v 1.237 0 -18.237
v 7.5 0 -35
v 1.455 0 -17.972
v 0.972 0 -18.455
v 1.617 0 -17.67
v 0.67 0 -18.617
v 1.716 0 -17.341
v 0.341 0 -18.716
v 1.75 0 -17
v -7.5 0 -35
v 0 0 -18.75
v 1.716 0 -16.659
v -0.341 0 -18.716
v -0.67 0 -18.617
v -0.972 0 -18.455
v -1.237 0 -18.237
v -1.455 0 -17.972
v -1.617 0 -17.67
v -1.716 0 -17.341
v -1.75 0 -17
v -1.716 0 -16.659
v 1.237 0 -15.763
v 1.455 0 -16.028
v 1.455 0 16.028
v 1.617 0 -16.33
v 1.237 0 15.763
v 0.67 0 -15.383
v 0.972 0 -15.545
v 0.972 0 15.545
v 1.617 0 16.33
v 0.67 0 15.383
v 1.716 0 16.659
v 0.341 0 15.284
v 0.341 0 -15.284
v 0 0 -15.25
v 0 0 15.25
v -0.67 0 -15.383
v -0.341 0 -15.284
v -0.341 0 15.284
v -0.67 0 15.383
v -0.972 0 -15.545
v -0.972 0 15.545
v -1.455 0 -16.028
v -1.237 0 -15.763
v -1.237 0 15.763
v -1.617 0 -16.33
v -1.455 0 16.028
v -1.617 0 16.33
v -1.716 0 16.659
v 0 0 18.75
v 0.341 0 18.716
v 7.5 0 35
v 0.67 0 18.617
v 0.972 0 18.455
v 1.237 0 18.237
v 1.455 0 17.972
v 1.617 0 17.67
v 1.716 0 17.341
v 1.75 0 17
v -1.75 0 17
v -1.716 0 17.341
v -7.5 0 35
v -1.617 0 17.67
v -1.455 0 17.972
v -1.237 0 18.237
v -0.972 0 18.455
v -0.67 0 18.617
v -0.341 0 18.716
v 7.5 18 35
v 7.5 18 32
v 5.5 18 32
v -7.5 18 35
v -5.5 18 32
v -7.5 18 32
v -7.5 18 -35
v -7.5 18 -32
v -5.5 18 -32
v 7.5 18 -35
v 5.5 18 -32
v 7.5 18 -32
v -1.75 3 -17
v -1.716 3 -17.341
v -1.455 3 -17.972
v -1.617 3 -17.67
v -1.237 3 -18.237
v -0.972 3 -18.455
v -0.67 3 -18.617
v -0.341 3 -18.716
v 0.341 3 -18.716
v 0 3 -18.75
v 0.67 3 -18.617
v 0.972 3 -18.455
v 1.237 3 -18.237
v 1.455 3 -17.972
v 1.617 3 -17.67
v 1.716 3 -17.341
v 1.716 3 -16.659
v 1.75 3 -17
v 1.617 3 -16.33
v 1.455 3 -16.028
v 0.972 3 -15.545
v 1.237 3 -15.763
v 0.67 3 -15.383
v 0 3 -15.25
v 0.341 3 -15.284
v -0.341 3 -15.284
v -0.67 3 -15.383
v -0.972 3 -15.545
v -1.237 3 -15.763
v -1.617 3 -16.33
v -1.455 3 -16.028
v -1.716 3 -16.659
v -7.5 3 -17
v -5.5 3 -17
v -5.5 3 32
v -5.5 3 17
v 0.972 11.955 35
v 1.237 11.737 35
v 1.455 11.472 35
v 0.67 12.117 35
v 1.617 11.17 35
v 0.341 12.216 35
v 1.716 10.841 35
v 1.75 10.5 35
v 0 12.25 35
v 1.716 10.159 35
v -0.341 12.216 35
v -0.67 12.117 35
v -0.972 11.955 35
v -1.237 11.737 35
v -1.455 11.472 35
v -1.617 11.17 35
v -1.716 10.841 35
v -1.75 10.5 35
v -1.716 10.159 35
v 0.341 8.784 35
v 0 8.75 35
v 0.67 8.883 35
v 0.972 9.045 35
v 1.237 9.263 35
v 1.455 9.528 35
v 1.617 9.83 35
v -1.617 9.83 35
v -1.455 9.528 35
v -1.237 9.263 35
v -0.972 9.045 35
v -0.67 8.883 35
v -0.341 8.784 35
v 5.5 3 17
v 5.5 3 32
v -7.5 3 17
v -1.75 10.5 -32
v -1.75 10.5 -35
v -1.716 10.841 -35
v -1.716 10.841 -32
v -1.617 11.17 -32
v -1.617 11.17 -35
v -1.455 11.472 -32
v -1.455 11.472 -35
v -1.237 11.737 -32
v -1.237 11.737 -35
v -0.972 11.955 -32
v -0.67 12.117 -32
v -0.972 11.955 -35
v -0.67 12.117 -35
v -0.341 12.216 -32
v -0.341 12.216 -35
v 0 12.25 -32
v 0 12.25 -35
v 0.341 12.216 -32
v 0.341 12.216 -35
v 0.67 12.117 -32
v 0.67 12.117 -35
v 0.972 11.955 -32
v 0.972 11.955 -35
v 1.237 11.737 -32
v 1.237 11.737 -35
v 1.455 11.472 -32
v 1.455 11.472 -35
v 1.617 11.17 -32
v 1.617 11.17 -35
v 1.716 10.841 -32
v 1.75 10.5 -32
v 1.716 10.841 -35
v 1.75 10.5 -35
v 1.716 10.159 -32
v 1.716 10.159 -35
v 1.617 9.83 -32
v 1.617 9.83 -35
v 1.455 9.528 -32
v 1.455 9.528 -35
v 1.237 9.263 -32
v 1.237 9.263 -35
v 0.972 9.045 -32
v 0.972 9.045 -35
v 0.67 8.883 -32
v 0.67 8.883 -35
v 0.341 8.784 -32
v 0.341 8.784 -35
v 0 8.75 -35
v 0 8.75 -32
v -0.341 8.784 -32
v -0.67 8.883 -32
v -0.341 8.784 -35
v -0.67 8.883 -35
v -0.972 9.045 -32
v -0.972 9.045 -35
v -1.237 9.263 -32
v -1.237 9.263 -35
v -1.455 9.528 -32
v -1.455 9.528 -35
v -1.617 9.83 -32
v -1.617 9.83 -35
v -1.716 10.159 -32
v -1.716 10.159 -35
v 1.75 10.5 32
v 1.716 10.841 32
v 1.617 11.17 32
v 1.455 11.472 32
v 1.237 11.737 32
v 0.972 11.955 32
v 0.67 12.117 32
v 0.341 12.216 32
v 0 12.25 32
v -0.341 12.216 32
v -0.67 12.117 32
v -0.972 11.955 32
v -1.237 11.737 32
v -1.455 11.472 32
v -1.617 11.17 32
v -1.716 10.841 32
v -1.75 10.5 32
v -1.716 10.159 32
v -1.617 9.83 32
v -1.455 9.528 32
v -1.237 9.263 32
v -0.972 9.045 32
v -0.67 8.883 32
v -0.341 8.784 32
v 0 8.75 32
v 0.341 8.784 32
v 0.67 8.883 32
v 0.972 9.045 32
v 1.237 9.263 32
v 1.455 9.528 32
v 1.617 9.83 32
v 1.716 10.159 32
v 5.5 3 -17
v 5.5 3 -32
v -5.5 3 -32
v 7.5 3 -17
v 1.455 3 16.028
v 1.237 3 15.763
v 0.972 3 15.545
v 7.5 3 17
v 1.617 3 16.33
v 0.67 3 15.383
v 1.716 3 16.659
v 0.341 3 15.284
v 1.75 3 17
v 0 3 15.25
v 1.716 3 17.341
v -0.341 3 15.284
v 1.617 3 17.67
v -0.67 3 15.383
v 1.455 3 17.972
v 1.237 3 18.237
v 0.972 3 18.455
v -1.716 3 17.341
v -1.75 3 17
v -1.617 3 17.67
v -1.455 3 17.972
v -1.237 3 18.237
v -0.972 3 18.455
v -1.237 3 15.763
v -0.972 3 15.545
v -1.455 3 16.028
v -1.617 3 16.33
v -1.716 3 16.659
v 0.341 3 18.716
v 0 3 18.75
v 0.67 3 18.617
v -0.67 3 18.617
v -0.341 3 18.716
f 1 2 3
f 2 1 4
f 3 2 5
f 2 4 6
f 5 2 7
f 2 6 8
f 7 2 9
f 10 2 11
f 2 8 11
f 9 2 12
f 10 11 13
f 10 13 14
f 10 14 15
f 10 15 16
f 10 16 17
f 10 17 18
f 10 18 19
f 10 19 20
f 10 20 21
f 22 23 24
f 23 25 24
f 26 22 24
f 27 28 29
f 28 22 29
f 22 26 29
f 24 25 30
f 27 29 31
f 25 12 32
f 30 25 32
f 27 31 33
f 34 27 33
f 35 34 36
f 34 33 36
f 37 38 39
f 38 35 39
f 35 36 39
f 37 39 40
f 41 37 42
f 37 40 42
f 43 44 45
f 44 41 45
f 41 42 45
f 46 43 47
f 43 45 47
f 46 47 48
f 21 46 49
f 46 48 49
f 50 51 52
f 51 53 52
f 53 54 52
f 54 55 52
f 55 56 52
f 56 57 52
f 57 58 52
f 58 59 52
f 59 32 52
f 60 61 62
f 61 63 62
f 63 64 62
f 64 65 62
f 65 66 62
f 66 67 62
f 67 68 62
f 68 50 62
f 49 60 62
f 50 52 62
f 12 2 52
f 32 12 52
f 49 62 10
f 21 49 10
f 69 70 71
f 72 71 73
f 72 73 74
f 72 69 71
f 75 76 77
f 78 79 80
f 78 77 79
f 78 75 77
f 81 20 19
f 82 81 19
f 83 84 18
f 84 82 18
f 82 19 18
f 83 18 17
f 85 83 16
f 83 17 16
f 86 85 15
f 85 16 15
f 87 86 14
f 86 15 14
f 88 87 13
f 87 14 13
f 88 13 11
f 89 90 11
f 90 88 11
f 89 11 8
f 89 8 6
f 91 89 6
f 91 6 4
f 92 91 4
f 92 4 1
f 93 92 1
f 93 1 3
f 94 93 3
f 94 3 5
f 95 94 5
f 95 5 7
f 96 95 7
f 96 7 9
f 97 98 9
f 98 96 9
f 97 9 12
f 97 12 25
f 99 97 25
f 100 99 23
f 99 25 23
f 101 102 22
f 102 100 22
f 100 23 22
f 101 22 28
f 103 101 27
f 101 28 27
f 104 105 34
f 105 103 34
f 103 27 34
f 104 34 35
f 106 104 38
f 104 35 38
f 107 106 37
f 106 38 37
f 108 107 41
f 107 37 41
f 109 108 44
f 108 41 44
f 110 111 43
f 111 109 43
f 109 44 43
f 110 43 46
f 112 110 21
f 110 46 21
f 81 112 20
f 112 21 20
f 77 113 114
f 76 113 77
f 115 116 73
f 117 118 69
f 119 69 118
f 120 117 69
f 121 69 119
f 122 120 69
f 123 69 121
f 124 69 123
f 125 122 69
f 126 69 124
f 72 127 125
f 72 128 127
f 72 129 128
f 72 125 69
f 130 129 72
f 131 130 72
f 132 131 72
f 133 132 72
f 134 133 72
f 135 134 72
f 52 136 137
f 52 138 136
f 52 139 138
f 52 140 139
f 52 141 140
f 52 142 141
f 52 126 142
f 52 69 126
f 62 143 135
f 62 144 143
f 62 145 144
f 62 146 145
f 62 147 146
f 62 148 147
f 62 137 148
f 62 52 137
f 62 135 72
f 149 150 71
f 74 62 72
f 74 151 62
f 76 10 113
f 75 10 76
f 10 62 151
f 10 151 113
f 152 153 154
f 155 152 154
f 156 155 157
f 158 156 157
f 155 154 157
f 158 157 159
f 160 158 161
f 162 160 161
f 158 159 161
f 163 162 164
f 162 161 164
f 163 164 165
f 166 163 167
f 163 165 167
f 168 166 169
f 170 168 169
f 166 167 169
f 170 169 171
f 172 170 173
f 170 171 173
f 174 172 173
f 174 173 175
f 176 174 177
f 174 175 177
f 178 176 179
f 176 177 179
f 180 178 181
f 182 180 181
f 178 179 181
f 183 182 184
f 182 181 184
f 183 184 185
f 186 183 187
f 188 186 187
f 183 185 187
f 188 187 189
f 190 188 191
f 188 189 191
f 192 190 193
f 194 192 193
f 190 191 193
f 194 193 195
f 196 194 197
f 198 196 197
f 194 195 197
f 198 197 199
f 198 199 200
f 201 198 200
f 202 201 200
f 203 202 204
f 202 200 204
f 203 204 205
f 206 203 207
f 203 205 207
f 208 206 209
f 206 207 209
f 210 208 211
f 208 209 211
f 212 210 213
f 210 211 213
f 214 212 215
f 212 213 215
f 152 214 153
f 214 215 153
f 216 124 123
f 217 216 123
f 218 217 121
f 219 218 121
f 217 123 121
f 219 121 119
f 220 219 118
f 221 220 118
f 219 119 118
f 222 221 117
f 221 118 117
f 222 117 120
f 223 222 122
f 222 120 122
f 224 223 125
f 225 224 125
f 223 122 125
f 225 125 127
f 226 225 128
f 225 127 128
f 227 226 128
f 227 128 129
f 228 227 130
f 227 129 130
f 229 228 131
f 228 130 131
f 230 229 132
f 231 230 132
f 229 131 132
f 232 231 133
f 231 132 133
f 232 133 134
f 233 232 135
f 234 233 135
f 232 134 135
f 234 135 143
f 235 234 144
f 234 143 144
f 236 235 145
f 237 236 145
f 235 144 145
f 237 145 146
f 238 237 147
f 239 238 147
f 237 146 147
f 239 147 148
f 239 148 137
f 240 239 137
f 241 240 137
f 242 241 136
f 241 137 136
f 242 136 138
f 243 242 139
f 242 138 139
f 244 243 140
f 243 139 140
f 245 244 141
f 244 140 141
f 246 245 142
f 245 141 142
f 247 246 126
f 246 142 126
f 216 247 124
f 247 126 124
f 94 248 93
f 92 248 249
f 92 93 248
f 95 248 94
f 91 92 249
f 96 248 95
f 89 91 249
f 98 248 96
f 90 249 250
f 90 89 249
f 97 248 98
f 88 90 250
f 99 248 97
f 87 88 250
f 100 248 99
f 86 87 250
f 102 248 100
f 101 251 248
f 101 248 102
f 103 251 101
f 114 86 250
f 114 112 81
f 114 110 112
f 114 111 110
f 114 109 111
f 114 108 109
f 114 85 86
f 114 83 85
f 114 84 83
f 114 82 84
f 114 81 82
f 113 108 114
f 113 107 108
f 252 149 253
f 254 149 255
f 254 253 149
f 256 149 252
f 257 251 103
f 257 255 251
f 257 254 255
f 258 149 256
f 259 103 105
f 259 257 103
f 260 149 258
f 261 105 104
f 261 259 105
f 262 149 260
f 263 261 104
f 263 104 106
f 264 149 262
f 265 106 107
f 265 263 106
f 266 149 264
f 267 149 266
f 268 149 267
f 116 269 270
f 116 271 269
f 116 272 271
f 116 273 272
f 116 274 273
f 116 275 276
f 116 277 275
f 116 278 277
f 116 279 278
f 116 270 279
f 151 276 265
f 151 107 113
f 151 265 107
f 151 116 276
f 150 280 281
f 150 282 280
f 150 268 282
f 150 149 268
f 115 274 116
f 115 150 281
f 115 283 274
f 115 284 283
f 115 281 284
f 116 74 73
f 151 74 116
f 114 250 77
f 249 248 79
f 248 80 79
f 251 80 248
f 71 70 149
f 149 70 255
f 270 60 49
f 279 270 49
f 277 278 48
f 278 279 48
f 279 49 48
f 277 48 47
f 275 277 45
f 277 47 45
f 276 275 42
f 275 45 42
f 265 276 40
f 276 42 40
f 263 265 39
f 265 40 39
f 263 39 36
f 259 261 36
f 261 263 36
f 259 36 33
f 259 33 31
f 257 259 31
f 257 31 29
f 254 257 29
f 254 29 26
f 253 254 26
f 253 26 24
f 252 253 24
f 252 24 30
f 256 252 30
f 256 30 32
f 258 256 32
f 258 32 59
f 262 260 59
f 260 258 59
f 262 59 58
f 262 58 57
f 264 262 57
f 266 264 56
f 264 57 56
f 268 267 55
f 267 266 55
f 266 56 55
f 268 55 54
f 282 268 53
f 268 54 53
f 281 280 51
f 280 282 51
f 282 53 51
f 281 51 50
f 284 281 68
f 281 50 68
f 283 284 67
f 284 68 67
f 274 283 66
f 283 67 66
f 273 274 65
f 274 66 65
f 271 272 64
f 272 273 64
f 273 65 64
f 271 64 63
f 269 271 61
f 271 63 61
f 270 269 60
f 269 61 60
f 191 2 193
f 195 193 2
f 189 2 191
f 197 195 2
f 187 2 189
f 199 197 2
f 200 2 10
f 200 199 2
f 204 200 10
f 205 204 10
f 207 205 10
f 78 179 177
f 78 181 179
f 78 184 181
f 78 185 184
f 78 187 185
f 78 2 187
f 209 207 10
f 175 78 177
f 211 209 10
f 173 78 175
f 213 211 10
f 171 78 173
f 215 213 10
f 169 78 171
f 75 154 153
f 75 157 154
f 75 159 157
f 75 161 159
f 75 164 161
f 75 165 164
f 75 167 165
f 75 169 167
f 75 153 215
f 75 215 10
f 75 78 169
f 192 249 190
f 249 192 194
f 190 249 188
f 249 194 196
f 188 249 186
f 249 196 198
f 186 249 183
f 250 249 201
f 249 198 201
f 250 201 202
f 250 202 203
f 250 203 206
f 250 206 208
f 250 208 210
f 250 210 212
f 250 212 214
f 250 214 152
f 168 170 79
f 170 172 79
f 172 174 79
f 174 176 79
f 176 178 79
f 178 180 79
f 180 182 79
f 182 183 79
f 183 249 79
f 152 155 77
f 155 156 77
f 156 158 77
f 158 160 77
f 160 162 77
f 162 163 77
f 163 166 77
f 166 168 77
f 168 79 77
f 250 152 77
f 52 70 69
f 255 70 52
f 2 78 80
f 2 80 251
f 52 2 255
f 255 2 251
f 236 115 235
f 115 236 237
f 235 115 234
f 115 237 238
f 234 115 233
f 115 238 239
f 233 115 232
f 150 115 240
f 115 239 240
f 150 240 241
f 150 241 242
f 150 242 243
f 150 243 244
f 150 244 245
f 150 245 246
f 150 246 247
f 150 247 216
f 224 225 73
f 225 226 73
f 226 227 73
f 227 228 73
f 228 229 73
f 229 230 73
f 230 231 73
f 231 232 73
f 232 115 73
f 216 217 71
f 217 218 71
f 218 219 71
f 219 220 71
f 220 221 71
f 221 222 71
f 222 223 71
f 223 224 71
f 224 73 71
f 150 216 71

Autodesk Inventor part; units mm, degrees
ref_plane "YZ Plane" through (0, 0, 0) normal (1, 0, 0) x (0, 1, 0)
ref_plane "XZ Plane" through (0, 0, 0) normal (0, 1, 0) x (-1, 0, 0)
ref_plane "XY Plane" through (0, 0, 0) normal (0, 0, 1) x (1, 0, 0)
sketch "Sketch1" plane through (0, 0, 0) normal (0, 1, 0) x (-1, 0, 0)
  line L0 (-7.5, 35) -> (7.5, 35)
  line L1 (7.5, 35) -> (7.5, -35)
  line L2 (7.5, -35) -> (-7.5, -35)
  line L3 (-7.5, -35) -> (-7.5, 35)
  line L4 (-7.5, 35) -> (7.5, -35) construction
  line L5 (7.5, 35) -> (-7.5, -35) construction
  circle A0 centre (0, 17) radius 1.75
  circle A1 centre (0, -17) radius 1.75
  point P0 (0, 0)
  point P1 (0, -35)
  dimension "d0" = 15
  dimension "d1" = 70
  dimension "d13" = 18
  dimension "d14" = 18
  dimension "d16" = 3.5
extrude "Extrusion1" add sketch "Sketch1" along normal blind 3
sketch "Sketch2" plane through (-7.5, 0, 35) normal (0, 0, 1) x (1, 0, 0)
  line L0 (0, 0) -> (15, 0) projected
  line L1 (15, 0) -> (15, 3) projected
  line L2 (0, 3) -> (15, 3) projected
  line L3 (0, 0) -> (0, 3) projected
  line L4 (15, 3) -> (0, 3) projected
  line L5 (0, 3) -> (15, 3)
  line L6 (15, 3) -> (15, 18)
  line L7 (15, 18) -> (0, 18)
  line L8 (0, 18) -> (0, 3)
  circle A0 centre (7.5, 10.5) radius 1.75
  point P0 (7.5, 0)
  point P1 (7.5, 18)
  point P2 (0, 10.5)
  dimension "d15" = 3.5
extrude "Extrusion2" add sketch "Sketch2" against normal blind 3 contours L8 L7 L6 L2
sketch "Sketch3" plane through (7.5, 0, -35) normal (0, 0, -1) x (-1, 0, 0)
  line L0 (15, 18) -> (0, 18) projected
  line L1 (0, 18) -> (0, 3) projected
  line L2 (15, 3) -> (0, 3) projected
  line L3 (15, 3) -> (15, 18) projected
  circle A0 centre (7.5, 10.5) radius 1.75 projected
  point P0 (7.5, 0)
extrude "Extrusion3" add sketch "Sketch3" against normal blind 3
sketch "Sketch4" plane through (7.5, 0, 35) normal (1, 0, 0) x (0, 0, -1)
  line L0 (0, 0) -> (70, 0) projected
  line L1 (70, 0) -> (70, 18) projected
  line L2 (70, 18) -> (67, 18) projected
  line L3 (67, 3) -> (67, 18) projected
  line L4 (3, 3) -> (67, 3) projected
  line L5 (3, 18) -> (3, 3) projected
  line L6 (0, 18) -> (3, 18) projected
  line L7 (0, 0) -> (0, 18) projected
  line L8 (3, 18) -> (18, 3)
  line L9 (67, 3) -> (67, 18) projected
  line L10 (67, 18) -> (52, 3)
  line L11 (67, 3) -> (3, 3) projected
  point P0 (35, 0)
  dimension "d8" = 45
extrude "Extrusion4" add sketch "Sketch4" against normal blind 2 contours L8 L4 L5 | L3 L4 L10
sketch "Sketch5" plane through (-7.5, 0, -35) normal (-1, 0, 0) x (0, 0, 1)
  line L0 (18, 3) -> (3, 3) projected
  line L1 (18, 3) -> (3, 18) projected
  line L2 (3, 3) -> (3, 18) projected
  line L3 (67, 3) -> (52, 3) projected
  line L4 (67, 18) -> (67, 3) projected
  line L5 (67, 18) -> (52, 3) projected
  point P0 (35, 0)
extrude "Extrusion5" add sketch "Sketch5" against normal blind 2
equation "\"d14\" = d13"
properties part number "Frame_Brace_Mount" material "ABS Plastic"
